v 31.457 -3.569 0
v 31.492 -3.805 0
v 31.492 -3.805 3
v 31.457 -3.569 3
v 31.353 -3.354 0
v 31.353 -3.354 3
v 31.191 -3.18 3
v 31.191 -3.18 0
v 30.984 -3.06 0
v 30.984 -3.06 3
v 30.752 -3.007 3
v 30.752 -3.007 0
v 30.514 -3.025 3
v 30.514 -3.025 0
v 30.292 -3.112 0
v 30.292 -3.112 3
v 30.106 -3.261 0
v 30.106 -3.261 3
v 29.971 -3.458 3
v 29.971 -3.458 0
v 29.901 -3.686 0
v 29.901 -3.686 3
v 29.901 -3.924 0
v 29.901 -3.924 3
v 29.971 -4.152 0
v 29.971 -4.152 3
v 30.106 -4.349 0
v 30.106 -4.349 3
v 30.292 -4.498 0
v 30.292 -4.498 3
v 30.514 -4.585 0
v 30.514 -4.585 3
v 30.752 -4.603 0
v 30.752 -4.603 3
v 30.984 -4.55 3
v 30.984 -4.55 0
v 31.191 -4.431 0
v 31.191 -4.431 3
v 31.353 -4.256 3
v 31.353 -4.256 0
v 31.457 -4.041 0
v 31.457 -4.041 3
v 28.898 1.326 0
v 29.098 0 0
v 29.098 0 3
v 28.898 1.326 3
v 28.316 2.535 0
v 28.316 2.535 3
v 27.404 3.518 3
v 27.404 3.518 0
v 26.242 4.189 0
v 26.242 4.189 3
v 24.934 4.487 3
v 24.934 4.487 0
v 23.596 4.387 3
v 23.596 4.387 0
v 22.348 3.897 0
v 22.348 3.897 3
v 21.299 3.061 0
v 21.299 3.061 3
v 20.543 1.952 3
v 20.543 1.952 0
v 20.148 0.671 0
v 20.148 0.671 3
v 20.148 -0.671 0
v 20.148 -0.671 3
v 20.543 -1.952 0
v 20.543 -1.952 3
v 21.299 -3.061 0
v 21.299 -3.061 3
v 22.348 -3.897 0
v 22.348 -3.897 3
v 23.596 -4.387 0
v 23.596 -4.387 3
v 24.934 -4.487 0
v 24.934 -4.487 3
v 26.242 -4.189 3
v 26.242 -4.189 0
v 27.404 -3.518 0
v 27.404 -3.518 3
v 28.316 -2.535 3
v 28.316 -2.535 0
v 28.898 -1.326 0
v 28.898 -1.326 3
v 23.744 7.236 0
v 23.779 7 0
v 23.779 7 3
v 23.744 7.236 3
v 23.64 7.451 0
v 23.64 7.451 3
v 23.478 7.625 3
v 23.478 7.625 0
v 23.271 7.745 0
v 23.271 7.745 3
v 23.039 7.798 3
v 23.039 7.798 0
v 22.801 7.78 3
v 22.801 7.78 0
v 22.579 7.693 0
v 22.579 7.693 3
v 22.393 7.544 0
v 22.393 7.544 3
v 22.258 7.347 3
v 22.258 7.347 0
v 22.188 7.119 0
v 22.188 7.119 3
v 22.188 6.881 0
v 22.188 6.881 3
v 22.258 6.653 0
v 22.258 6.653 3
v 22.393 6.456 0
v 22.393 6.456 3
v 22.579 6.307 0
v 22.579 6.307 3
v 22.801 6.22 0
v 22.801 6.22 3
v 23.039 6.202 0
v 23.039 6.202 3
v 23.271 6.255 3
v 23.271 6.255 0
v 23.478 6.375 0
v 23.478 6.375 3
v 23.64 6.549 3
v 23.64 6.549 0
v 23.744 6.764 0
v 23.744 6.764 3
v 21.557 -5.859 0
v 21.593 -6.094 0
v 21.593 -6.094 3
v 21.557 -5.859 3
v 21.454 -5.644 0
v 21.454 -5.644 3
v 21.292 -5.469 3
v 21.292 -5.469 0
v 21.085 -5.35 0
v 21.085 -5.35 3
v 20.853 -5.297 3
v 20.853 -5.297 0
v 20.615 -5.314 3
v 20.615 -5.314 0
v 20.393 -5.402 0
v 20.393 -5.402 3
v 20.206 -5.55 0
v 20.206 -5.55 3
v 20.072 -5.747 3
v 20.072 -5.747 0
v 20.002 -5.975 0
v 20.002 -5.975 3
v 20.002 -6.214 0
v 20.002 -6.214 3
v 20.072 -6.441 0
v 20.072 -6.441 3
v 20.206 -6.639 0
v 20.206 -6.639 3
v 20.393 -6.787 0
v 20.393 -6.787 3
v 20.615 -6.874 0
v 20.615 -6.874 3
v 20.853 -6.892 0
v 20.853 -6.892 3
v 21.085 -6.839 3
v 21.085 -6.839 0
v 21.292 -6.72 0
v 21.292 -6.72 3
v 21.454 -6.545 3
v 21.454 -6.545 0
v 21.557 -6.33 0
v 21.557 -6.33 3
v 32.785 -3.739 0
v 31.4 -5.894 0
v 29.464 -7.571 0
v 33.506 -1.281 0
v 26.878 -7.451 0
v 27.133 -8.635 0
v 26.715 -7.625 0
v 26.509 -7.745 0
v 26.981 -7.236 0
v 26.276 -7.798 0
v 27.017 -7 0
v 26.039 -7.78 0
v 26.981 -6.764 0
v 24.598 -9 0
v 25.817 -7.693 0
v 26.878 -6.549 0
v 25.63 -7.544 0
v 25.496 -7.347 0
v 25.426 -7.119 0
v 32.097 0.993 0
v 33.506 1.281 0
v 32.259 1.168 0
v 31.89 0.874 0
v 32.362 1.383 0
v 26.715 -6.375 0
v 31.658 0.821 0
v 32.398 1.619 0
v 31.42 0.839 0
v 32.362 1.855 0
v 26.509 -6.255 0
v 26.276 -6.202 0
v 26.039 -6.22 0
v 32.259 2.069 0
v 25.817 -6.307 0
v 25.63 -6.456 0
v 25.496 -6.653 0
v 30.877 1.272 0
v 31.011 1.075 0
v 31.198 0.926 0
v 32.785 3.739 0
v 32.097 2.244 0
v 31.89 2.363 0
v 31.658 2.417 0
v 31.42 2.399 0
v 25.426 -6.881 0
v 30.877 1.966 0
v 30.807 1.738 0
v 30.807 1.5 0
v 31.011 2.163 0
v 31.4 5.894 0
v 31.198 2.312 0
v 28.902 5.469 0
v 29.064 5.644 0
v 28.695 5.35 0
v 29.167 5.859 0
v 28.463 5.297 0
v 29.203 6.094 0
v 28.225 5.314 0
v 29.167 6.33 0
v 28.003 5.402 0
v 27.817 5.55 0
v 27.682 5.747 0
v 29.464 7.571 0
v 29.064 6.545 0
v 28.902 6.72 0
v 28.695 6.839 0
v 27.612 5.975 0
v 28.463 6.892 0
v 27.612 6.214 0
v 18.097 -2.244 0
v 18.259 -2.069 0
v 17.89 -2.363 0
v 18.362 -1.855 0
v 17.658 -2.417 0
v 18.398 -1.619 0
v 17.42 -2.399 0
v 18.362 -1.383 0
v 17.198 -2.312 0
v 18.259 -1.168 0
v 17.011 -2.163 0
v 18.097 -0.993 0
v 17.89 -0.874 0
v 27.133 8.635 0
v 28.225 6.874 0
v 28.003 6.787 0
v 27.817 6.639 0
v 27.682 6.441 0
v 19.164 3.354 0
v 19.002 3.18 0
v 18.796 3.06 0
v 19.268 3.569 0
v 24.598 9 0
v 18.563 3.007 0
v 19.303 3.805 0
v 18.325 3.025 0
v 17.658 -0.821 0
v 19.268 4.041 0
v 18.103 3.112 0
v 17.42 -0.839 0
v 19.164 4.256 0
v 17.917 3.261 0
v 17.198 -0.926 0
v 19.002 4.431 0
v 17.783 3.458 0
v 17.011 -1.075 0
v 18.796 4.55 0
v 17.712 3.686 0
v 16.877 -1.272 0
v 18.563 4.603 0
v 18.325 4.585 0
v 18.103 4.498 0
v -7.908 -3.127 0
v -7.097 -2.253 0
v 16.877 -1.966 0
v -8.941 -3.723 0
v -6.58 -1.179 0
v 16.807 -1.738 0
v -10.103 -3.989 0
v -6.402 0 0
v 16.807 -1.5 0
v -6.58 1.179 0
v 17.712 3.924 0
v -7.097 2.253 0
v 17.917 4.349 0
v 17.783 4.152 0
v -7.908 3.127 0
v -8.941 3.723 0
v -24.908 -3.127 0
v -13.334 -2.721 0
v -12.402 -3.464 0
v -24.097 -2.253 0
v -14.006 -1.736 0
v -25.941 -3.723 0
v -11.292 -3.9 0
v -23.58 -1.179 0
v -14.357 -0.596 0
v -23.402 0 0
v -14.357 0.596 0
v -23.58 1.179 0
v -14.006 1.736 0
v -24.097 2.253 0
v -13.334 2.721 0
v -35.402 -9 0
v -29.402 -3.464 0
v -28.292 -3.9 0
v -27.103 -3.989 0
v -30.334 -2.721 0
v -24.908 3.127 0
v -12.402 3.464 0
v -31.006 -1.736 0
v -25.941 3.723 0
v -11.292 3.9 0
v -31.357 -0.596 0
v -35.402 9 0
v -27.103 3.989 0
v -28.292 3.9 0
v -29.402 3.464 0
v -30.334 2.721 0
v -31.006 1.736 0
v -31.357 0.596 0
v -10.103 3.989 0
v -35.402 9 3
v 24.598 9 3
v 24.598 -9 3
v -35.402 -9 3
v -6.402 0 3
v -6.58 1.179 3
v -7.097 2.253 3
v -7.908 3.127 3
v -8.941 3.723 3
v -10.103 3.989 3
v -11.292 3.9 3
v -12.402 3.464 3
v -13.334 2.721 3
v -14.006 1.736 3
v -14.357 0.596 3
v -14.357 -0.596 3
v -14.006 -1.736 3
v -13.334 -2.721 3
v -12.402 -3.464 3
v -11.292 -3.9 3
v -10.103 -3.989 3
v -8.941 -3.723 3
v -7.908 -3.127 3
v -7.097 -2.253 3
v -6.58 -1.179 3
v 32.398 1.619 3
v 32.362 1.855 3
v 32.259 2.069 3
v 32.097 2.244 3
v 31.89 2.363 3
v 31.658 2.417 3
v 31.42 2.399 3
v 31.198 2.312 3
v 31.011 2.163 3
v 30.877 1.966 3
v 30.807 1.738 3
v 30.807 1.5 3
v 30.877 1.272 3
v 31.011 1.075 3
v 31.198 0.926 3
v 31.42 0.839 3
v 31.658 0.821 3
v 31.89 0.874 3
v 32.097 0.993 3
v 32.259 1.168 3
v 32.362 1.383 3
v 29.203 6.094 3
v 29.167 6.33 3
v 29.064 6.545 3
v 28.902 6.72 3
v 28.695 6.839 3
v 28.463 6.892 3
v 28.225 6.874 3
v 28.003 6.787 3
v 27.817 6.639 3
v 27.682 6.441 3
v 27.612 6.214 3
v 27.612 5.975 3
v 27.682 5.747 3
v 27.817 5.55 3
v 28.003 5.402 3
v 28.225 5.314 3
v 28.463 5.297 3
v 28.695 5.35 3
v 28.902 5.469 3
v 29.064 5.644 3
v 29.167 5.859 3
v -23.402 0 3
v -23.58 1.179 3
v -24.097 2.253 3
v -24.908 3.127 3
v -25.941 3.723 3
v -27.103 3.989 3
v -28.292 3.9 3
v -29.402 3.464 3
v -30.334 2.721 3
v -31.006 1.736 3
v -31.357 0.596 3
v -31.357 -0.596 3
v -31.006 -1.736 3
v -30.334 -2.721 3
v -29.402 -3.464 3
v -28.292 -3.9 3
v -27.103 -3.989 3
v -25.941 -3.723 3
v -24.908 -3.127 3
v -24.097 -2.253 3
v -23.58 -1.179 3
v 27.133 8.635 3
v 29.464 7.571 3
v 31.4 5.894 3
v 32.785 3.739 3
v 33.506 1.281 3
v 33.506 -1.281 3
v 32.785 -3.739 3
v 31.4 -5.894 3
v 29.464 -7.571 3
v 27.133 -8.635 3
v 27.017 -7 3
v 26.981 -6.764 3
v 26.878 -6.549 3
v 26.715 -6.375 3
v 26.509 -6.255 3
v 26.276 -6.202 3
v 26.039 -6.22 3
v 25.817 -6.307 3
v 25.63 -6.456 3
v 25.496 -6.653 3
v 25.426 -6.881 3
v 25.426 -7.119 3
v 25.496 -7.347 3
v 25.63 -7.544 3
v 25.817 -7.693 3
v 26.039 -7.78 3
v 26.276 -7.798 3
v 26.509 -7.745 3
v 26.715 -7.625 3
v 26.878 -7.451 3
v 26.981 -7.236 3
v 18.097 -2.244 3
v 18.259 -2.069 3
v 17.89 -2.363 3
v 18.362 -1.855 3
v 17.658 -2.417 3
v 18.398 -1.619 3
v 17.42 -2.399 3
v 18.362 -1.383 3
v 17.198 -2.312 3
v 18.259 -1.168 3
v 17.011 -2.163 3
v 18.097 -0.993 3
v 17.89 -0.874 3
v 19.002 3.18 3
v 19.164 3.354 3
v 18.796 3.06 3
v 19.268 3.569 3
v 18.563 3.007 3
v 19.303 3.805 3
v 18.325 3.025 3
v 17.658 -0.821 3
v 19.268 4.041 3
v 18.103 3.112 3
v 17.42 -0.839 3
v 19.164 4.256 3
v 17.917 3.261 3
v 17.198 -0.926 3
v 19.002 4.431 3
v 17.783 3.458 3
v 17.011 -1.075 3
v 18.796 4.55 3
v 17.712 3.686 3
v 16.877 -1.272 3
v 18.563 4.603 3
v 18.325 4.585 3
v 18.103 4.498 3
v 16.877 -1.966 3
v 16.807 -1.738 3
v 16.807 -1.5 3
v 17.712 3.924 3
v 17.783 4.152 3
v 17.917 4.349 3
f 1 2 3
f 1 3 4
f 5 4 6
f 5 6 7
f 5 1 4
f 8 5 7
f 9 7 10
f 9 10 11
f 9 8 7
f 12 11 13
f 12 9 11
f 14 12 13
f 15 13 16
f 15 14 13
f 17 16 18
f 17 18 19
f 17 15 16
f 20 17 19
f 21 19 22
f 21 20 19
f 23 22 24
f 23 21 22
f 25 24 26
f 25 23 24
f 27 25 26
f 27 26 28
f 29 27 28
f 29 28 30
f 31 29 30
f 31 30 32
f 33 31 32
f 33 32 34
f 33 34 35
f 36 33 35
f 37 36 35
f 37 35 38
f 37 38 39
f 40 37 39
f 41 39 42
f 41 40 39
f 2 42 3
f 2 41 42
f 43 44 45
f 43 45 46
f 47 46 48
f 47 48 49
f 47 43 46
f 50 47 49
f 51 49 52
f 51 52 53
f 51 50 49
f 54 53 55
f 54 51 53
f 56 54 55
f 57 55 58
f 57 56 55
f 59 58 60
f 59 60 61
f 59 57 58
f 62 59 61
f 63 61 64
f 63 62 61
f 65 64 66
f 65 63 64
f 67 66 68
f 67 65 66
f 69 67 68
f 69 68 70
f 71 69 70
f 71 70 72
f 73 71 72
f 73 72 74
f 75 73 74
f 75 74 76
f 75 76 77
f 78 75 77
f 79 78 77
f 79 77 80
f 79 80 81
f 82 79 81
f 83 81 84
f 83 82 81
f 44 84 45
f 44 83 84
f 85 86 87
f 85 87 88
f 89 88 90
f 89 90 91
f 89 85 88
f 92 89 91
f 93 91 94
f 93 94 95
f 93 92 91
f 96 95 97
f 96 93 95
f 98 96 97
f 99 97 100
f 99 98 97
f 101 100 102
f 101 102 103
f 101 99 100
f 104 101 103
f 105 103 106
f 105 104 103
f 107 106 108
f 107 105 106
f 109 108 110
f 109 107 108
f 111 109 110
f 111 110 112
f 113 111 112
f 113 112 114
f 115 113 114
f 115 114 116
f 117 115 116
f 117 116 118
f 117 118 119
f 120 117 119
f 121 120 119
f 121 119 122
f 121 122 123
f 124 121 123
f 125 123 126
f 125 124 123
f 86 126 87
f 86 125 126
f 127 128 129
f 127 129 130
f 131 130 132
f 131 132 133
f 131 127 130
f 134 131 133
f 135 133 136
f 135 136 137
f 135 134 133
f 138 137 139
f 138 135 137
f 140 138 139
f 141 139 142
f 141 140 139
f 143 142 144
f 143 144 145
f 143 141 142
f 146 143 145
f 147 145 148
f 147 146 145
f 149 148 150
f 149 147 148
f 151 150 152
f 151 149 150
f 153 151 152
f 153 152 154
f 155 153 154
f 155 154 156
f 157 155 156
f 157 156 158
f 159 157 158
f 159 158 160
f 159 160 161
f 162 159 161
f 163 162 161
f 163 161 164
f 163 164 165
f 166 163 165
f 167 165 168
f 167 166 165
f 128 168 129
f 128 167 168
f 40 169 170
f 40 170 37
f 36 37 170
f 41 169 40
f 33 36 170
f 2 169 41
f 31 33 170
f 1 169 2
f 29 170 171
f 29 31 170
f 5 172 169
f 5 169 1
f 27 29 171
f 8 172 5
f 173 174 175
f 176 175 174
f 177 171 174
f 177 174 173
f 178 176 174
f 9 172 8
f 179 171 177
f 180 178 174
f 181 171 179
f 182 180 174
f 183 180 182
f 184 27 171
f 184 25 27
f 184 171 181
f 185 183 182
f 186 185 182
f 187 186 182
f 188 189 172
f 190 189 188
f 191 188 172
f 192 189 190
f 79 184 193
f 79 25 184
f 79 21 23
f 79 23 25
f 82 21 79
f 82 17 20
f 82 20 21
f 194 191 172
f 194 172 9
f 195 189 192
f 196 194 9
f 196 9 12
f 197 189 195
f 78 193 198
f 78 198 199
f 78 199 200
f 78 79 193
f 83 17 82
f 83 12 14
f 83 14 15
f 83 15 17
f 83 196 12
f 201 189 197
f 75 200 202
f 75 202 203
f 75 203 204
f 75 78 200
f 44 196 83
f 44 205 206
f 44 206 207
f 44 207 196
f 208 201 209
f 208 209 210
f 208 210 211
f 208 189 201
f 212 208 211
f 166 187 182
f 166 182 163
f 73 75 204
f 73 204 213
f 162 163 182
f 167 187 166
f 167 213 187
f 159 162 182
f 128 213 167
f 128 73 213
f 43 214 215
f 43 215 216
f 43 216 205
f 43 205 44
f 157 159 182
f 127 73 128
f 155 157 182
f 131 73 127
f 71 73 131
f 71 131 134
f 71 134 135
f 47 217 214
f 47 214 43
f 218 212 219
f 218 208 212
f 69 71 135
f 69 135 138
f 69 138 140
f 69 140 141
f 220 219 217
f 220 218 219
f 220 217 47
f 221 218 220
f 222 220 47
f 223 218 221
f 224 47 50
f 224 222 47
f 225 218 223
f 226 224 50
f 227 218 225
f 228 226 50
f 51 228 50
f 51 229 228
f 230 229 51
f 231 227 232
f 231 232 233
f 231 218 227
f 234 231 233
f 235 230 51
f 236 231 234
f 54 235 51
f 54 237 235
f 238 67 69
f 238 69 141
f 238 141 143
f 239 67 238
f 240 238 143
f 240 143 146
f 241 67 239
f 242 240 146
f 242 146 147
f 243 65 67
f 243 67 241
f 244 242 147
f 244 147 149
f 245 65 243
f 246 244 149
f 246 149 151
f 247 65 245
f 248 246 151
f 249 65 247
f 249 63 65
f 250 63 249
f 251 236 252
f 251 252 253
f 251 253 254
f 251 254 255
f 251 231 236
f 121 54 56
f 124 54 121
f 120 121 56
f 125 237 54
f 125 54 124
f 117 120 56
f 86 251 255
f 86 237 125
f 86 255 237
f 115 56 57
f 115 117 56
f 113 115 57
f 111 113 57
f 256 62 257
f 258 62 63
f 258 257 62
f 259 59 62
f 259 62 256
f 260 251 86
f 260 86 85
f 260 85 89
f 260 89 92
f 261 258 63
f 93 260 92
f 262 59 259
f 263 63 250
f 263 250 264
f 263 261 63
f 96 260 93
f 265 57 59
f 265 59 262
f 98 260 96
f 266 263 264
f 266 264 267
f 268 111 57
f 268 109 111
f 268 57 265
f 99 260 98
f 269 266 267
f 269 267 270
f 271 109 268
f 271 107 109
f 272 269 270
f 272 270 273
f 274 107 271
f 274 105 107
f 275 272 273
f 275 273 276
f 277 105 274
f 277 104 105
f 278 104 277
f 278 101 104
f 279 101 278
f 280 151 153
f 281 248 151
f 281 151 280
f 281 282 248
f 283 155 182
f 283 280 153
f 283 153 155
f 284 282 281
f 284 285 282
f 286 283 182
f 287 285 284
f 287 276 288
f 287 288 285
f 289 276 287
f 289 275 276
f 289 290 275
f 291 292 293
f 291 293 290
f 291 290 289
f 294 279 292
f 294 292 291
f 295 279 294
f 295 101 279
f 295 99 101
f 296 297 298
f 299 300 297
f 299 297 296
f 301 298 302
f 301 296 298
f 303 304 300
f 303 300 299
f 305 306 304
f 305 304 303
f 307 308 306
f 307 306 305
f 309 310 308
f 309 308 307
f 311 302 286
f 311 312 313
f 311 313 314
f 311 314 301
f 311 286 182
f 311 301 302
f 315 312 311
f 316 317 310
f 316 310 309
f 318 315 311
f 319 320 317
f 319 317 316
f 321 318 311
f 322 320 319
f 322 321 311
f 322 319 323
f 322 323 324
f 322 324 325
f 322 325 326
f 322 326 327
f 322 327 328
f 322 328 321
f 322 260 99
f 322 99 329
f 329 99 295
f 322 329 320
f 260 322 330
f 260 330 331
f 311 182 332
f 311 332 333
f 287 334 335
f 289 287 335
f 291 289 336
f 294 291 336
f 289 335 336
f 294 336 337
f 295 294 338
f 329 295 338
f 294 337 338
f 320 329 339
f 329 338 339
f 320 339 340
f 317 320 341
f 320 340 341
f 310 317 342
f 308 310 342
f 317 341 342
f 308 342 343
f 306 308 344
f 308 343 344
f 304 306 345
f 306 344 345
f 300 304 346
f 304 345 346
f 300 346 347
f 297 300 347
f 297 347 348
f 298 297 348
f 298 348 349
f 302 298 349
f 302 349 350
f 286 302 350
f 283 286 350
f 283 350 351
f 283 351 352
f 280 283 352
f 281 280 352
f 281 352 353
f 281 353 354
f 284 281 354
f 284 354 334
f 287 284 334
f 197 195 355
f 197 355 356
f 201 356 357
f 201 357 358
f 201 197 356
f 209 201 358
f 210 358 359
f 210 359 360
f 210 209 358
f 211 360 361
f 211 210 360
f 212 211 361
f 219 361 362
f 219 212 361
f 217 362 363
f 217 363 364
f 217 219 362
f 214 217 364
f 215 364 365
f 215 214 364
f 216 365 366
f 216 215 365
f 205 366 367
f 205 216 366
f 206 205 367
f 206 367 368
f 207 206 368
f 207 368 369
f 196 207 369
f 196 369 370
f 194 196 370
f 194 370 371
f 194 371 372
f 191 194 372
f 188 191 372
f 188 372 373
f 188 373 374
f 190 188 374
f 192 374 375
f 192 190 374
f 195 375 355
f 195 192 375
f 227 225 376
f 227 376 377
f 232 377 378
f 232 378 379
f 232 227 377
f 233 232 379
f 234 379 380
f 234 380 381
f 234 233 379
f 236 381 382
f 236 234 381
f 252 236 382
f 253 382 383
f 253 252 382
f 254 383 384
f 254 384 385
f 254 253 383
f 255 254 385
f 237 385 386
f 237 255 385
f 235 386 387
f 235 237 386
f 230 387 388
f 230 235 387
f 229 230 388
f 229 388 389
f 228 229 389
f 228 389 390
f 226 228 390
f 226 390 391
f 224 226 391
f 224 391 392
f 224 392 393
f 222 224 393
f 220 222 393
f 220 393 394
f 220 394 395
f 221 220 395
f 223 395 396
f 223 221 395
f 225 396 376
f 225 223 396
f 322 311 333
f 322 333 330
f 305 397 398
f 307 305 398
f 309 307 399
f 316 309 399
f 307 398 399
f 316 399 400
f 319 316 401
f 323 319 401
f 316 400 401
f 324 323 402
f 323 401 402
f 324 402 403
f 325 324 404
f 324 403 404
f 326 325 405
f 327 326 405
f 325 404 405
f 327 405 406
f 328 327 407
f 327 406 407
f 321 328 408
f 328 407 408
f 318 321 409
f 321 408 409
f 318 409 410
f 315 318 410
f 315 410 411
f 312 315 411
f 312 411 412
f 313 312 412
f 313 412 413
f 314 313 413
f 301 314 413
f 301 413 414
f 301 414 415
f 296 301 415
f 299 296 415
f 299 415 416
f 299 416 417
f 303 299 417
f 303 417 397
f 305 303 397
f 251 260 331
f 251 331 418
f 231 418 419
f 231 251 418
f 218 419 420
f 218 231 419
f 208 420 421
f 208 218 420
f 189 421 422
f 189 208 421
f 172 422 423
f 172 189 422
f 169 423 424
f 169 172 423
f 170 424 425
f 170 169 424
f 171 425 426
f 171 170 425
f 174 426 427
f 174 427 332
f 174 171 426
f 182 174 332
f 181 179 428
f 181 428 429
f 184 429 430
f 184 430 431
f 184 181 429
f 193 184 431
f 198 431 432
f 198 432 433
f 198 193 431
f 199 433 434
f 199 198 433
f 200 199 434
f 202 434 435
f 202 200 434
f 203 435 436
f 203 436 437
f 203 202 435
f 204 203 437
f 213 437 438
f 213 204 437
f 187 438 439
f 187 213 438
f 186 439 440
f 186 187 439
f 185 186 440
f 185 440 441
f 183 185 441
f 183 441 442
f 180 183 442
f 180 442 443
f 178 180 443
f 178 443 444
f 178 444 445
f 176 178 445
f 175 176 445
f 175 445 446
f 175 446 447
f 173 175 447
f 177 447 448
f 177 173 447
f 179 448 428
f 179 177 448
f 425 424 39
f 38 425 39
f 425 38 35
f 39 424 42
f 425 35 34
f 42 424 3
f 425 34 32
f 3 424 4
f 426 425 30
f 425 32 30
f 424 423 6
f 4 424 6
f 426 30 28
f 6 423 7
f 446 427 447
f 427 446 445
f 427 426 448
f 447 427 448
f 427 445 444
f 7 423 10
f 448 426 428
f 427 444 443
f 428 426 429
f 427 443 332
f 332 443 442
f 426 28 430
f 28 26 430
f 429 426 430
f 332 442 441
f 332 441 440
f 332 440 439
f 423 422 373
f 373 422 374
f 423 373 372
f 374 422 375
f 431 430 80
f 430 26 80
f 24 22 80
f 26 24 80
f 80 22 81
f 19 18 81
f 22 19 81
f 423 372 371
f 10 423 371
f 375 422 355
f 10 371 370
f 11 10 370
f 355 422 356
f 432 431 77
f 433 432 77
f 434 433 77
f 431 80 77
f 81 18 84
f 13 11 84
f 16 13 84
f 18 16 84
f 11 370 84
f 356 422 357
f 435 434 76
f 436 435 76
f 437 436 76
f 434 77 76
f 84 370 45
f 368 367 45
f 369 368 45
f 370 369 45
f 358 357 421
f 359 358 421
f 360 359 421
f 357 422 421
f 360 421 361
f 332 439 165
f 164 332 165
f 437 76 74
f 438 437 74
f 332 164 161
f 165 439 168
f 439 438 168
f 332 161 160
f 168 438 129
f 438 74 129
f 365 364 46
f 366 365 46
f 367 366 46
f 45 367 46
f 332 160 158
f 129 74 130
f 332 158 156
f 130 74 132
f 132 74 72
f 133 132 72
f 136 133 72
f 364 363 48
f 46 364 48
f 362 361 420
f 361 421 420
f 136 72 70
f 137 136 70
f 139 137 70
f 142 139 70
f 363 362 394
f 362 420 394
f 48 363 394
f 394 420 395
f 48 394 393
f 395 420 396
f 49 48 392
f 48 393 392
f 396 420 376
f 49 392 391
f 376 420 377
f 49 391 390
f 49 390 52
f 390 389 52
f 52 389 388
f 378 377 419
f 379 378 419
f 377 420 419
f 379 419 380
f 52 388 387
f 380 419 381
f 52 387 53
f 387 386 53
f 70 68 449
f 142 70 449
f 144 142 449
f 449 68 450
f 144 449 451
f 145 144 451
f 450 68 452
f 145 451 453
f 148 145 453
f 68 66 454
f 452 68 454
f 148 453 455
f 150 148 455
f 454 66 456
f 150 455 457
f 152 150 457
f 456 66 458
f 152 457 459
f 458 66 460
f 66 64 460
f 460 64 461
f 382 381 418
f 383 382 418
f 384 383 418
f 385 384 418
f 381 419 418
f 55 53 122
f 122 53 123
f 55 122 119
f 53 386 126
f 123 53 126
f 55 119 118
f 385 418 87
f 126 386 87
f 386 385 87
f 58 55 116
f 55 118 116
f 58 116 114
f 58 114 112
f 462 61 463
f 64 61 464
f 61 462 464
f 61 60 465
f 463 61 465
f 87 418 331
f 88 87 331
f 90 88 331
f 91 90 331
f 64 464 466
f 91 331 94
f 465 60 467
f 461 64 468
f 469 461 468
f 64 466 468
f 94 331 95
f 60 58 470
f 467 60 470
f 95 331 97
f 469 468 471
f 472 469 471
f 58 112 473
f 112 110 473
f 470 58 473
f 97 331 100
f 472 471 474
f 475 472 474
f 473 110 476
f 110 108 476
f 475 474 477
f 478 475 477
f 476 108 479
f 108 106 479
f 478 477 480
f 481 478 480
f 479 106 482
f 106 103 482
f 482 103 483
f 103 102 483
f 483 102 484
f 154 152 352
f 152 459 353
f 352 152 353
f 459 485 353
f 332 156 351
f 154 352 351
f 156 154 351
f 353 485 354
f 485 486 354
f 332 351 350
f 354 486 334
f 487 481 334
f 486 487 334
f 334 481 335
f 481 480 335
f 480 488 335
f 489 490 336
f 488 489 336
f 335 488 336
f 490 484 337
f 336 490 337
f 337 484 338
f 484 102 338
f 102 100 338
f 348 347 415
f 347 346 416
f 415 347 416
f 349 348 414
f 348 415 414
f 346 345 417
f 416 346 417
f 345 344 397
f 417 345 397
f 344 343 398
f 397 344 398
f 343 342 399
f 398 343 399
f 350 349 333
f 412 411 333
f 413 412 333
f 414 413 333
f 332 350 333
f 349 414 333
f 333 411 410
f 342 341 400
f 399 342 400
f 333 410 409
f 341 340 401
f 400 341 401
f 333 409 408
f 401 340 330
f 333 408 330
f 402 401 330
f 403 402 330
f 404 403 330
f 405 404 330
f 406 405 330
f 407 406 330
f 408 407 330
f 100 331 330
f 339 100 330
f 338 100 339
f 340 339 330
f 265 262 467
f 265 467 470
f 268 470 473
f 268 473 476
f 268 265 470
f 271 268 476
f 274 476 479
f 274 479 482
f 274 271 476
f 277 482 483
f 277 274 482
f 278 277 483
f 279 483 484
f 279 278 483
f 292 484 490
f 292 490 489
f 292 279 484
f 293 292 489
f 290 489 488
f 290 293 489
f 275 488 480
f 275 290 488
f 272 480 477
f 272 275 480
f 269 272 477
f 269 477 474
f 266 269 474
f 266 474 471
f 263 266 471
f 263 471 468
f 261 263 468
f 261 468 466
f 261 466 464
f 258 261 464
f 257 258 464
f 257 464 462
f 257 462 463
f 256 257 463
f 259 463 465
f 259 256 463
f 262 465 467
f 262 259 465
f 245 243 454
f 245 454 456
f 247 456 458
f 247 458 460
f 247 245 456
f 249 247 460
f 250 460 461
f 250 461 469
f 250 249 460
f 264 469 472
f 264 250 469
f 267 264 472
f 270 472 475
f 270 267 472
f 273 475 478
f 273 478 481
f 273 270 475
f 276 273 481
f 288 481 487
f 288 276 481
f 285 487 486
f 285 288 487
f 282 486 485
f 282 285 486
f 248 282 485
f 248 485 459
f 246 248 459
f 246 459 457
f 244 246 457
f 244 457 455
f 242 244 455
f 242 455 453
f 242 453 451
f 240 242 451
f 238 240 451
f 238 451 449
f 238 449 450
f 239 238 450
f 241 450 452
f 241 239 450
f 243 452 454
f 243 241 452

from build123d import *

# Parameters (mm, degrees)
ESQUISSE1_R             = 4.5
ESQUISSE1_R_2           = 0.8
BOSS_EXTRU_1_DEPTH      = 3
ESQUISSE2_R             = 4
ENL_V_MAT_EXTRU_1_DEPTH = 10


with BuildPart() as part:
    # Esquisse1 → Boss.-Extru.1 (new body)
    with BuildSketch(Plane.XY):
        with BuildLine():
            Line((1.597834667, 9), (24.597834667, 9))
            ThreePointArc((24.597834667, 9), (33.597834667, 0), (24.597834667, -9))
            Line((24.597834667, -9), (-35.402165333, -9))
            Line((-35.402165333, -9), (-35.402165333, 9))
            Line((-35.402165333, 9), (-16.752165333, 9))
            Line((-16.752165333, 9), (-7.052165333, 9))
            Line((-7.052165333, 9), (1.597834667, 9))
        make_face()
        with Locations((24.597834667, 0)):
            Circle(ESQUISSE1_R, mode=Mode.SUBTRACT)
        with Locations((22.97907079, 7)):
            Circle(ESQUISSE1_R_2, mode=Mode.SUBTRACT)
        with Locations((28.402943221, 6.094386383)):
            Circle(ESQUISSE1_R_2, mode=Mode.SUBTRACT)
        with Locations((31.597834667, 1.618763877)):
            Circle(ESQUISSE1_R_2, mode=Mode.SUBTRACT)
        with Locations((30.69222105, -3.805108554)):
            Circle(ESQUISSE1_R_2, mode=Mode.SUBTRACT)
        with Locations((26.216598544, -7)):
            Circle(ESQUISSE1_R_2, mode=Mode.SUBTRACT)
        with Locations((20.792726113, -6.094386383)):
            Circle(ESQUISSE1_R_2, mode=Mode.SUBTRACT)
        with Locations((17.597834667, -1.618763877)):
            Circle(ESQUISSE1_R_2, mode=Mode.SUBTRACT)
        with Locations((18.503448284, 3.805108554)):
            Circle(ESQUISSE1_R_2, mode=Mode.SUBTRACT)
    extrude(amount=BOSS_EXTRU_1_DEPTH)

    # Esquisse2 → Enlèv. mat.-Extru.1 (cut)
    with BuildSketch(Plane.XY.offset(3)):
        with Locations((-27.402165333, 0)):
            Circle(ESQUISSE2_R)
        with Locations((-10.402165333, 0)):
            Circle(ESQUISSE2_R)
    extrude(amount=-ENL_V_MAT_EXTRU_1_DEPTH, mode=Mode.SUBTRACT)


solid = part.part
